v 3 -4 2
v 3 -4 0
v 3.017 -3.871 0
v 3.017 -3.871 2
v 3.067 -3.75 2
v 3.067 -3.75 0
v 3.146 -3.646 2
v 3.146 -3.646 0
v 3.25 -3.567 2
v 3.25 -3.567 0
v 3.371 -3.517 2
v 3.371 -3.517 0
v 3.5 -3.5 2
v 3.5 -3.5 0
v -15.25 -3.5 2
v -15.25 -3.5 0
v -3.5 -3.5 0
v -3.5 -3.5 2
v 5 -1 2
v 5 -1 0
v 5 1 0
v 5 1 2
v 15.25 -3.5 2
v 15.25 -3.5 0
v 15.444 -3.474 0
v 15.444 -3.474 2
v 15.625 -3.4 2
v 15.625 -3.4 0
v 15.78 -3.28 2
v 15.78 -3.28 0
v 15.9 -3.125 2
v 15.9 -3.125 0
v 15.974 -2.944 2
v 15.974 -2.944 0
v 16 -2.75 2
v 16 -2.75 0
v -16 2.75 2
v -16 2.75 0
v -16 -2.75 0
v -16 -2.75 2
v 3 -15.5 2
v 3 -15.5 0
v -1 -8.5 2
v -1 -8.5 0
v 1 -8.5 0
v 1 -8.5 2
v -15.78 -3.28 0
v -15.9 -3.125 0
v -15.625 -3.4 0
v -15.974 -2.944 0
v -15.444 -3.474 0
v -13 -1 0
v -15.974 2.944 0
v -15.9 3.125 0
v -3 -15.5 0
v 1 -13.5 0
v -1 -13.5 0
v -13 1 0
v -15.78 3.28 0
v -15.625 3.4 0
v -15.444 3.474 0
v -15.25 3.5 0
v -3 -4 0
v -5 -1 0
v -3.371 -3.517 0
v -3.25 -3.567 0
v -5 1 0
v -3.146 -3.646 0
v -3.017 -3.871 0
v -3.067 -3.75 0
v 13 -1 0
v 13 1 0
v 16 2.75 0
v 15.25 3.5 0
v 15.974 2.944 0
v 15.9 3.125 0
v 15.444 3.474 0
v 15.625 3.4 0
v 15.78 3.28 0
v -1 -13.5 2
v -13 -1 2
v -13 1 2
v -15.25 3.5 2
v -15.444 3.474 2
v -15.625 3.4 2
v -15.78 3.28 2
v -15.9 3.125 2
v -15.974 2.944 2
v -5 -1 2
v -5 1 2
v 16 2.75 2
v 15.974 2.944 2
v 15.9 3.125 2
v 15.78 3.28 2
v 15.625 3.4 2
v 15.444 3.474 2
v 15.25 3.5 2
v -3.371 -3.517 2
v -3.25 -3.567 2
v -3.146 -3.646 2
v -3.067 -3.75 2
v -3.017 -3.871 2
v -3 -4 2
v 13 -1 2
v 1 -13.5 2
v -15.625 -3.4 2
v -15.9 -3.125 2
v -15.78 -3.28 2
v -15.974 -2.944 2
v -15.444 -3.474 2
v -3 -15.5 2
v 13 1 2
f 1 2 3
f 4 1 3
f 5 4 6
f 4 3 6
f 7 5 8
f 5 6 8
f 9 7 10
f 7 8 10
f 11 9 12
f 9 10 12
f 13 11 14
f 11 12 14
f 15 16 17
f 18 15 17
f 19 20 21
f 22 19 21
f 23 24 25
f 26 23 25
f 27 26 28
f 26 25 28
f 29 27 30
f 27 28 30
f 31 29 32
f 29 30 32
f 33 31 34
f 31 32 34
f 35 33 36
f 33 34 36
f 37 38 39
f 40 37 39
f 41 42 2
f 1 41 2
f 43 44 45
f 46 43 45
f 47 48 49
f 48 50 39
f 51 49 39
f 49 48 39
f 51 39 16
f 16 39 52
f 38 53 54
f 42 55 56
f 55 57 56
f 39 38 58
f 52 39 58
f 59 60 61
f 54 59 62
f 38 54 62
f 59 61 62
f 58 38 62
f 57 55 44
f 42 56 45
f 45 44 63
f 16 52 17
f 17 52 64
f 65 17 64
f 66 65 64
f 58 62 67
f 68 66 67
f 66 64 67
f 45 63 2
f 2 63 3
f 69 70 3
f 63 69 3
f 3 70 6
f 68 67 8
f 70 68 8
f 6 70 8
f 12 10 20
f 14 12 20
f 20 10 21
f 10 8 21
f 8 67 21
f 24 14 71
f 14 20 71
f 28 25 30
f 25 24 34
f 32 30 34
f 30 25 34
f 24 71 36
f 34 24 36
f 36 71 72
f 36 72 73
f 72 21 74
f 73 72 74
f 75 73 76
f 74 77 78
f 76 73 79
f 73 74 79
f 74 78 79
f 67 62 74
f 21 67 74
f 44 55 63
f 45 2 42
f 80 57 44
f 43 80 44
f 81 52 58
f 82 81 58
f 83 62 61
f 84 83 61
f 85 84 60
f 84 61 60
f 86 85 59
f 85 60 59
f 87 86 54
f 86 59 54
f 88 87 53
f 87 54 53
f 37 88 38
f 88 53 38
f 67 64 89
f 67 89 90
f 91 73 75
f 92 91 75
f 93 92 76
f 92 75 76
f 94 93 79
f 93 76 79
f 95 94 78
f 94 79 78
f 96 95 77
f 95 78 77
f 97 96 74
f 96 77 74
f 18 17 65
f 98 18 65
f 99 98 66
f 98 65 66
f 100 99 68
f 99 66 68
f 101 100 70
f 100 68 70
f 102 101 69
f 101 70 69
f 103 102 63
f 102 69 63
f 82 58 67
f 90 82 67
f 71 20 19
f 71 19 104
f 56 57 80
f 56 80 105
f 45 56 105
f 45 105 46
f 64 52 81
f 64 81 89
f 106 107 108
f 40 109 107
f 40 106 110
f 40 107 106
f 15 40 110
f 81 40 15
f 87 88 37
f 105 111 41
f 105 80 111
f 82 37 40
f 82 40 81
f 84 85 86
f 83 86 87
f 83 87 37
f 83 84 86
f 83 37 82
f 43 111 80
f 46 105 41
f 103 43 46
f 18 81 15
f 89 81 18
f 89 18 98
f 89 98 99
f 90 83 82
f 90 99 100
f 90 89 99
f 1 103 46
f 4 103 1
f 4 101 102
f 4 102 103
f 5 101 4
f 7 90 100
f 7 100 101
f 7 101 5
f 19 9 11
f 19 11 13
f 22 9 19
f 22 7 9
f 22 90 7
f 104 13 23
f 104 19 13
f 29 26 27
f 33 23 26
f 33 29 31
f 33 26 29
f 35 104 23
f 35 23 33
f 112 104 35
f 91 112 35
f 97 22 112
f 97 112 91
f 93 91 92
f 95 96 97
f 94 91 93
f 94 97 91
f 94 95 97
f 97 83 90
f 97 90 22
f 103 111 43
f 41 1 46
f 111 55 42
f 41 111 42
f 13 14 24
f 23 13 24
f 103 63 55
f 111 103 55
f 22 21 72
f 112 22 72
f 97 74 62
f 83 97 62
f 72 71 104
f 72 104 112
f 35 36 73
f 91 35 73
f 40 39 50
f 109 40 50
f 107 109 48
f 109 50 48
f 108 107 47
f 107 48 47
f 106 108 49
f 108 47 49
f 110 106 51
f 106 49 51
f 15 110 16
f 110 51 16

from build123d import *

# Parameters (mm, degrees)
SKETCH1_W           = 8
SKETCH1_H           = 2
SKETCH1_W_2         = 2
SKETCH1_H_2         = 5
BOSS_EXTRUDE1_DEPTH = 2


with BuildPart() as part:
    # Sketch1 → Boss-Extrude1 (new body)
    with BuildSketch(Plane.XY):
        with BuildLine():
            Line((15.25, 3.5), (-15.25, 3.5))
            ThreePointArc((-15.25, 3.5), (-15.780330086, 3.280330086), (-16, 2.75))
            Line((-16, 2.75), (-16, -2.75))
            ThreePointArc((-16, -2.75), (-15.780330086, -3.280330086), (-15.25, -3.5))
            Line((-15.25, -3.5), (-3.5, -3.5))
            ThreePointArc((-3.5, -3.5), (-3.146446609, -3.646446609), (-3, -4))
            Line((-3, -4), (-3, -15.5))
            Line((-3, -15.5), (3, -15.5))
            Line((3, -15.5), (3, -4))
            ThreePointArc((3, -4), (3.146446609, -3.646446609), (3.5, -3.5))
            Line((3.5, -3.5), (15.25, -3.5))
            ThreePointArc((15.25, -3.5), (15.780330086, -3.280330086), (16, -2.75))
            Line((16, -2.75), (16, 2.75))
            ThreePointArc((16, 2.75), (15.780330086, 3.280330086), (15.25, 3.5))
        make_face()
        with Locations((-9, 0)):
            Rectangle(SKETCH1_W, SKETCH1_H, mode=Mode.SUBTRACT)
        with Locations((9, 0)):
            Rectangle(SKETCH1_W, SKETCH1_H, mode=Mode.SUBTRACT)
        with Locations((0, -11)):
            Rectangle(SKETCH1_W_2, SKETCH1_H_2, mode=Mode.SUBTRACT)
    extrude(amount=BOSS_EXTRUDE1_DEPTH)


solid = part.part
